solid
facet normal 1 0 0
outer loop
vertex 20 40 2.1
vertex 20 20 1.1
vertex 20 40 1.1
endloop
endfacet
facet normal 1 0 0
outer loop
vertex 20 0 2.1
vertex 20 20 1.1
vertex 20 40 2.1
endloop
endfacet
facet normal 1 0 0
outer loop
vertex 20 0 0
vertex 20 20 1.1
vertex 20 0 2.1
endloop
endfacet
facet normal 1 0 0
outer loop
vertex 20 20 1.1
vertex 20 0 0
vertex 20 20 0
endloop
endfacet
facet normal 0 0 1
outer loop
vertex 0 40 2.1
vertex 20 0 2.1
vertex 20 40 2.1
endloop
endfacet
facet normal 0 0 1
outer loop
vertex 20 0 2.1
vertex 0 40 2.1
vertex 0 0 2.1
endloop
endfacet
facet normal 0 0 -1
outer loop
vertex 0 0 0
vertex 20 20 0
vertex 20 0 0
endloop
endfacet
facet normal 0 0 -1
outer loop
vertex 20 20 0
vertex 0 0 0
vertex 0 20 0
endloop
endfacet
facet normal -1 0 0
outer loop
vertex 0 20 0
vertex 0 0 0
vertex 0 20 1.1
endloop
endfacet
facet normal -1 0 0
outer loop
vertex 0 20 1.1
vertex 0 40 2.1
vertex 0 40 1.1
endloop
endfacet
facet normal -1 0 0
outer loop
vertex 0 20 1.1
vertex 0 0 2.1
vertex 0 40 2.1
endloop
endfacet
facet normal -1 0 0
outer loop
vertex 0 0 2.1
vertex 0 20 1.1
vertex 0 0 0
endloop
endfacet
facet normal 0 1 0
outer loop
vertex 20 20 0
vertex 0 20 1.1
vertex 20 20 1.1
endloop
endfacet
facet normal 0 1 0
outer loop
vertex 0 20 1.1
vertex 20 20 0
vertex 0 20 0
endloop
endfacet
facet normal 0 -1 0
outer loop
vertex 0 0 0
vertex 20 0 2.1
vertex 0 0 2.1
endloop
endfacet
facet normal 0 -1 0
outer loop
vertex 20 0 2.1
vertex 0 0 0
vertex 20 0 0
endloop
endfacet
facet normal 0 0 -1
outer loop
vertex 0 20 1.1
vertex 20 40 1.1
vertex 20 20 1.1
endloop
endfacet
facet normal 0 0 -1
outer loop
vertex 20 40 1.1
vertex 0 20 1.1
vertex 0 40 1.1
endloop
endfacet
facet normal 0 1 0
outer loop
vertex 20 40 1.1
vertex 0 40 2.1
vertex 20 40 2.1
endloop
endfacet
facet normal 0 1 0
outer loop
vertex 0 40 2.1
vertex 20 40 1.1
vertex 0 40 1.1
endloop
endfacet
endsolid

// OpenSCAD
cube(size=[20,20,2.1]);
translate([0, 0, 1.1])
cube(size=[20,40,1]);
